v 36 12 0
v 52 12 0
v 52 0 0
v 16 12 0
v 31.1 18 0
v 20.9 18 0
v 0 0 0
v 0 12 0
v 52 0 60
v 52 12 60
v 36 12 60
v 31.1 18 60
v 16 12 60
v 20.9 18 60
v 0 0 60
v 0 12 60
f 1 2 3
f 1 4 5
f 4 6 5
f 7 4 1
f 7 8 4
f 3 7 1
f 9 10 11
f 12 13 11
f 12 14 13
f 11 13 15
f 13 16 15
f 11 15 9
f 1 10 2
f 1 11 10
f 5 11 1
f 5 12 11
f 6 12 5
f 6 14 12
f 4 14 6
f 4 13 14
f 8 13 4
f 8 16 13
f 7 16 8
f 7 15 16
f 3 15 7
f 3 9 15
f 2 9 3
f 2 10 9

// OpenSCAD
$fn = 32;

// ----------------------------------------------------------------------
// V guide rail: dovetail, 52 mm wide
// ----------------------------------------------------------------------

// --- parameters (mm) ---
rail_w = 52;              // rail width, X
base_t = 12;              // base plate thickness
v_depth = 6;              // V feature depth / height
v_half_w = 10;            // half width of the V at the base face
plate_t = 60;             // rail length, Z (the extrusion height)
top_half_w = 5.1;         // half width at the dovetail top

dovetail_base = 2 * v_half_w;  // dovetail width at the base
dovetail_top = 2 * top_half_w;  // dovetail width at the top

profile = [[0, 0], [52, 0], [52, 12], [36, 12], [31.1, 18], [20.9, 18], [16, 12], [0, 12]];  // primary outline, 8 points, counter clockwise

// --- the one profile operation ---
linear_extrude(height = plate_t) polygon(points = profile);
